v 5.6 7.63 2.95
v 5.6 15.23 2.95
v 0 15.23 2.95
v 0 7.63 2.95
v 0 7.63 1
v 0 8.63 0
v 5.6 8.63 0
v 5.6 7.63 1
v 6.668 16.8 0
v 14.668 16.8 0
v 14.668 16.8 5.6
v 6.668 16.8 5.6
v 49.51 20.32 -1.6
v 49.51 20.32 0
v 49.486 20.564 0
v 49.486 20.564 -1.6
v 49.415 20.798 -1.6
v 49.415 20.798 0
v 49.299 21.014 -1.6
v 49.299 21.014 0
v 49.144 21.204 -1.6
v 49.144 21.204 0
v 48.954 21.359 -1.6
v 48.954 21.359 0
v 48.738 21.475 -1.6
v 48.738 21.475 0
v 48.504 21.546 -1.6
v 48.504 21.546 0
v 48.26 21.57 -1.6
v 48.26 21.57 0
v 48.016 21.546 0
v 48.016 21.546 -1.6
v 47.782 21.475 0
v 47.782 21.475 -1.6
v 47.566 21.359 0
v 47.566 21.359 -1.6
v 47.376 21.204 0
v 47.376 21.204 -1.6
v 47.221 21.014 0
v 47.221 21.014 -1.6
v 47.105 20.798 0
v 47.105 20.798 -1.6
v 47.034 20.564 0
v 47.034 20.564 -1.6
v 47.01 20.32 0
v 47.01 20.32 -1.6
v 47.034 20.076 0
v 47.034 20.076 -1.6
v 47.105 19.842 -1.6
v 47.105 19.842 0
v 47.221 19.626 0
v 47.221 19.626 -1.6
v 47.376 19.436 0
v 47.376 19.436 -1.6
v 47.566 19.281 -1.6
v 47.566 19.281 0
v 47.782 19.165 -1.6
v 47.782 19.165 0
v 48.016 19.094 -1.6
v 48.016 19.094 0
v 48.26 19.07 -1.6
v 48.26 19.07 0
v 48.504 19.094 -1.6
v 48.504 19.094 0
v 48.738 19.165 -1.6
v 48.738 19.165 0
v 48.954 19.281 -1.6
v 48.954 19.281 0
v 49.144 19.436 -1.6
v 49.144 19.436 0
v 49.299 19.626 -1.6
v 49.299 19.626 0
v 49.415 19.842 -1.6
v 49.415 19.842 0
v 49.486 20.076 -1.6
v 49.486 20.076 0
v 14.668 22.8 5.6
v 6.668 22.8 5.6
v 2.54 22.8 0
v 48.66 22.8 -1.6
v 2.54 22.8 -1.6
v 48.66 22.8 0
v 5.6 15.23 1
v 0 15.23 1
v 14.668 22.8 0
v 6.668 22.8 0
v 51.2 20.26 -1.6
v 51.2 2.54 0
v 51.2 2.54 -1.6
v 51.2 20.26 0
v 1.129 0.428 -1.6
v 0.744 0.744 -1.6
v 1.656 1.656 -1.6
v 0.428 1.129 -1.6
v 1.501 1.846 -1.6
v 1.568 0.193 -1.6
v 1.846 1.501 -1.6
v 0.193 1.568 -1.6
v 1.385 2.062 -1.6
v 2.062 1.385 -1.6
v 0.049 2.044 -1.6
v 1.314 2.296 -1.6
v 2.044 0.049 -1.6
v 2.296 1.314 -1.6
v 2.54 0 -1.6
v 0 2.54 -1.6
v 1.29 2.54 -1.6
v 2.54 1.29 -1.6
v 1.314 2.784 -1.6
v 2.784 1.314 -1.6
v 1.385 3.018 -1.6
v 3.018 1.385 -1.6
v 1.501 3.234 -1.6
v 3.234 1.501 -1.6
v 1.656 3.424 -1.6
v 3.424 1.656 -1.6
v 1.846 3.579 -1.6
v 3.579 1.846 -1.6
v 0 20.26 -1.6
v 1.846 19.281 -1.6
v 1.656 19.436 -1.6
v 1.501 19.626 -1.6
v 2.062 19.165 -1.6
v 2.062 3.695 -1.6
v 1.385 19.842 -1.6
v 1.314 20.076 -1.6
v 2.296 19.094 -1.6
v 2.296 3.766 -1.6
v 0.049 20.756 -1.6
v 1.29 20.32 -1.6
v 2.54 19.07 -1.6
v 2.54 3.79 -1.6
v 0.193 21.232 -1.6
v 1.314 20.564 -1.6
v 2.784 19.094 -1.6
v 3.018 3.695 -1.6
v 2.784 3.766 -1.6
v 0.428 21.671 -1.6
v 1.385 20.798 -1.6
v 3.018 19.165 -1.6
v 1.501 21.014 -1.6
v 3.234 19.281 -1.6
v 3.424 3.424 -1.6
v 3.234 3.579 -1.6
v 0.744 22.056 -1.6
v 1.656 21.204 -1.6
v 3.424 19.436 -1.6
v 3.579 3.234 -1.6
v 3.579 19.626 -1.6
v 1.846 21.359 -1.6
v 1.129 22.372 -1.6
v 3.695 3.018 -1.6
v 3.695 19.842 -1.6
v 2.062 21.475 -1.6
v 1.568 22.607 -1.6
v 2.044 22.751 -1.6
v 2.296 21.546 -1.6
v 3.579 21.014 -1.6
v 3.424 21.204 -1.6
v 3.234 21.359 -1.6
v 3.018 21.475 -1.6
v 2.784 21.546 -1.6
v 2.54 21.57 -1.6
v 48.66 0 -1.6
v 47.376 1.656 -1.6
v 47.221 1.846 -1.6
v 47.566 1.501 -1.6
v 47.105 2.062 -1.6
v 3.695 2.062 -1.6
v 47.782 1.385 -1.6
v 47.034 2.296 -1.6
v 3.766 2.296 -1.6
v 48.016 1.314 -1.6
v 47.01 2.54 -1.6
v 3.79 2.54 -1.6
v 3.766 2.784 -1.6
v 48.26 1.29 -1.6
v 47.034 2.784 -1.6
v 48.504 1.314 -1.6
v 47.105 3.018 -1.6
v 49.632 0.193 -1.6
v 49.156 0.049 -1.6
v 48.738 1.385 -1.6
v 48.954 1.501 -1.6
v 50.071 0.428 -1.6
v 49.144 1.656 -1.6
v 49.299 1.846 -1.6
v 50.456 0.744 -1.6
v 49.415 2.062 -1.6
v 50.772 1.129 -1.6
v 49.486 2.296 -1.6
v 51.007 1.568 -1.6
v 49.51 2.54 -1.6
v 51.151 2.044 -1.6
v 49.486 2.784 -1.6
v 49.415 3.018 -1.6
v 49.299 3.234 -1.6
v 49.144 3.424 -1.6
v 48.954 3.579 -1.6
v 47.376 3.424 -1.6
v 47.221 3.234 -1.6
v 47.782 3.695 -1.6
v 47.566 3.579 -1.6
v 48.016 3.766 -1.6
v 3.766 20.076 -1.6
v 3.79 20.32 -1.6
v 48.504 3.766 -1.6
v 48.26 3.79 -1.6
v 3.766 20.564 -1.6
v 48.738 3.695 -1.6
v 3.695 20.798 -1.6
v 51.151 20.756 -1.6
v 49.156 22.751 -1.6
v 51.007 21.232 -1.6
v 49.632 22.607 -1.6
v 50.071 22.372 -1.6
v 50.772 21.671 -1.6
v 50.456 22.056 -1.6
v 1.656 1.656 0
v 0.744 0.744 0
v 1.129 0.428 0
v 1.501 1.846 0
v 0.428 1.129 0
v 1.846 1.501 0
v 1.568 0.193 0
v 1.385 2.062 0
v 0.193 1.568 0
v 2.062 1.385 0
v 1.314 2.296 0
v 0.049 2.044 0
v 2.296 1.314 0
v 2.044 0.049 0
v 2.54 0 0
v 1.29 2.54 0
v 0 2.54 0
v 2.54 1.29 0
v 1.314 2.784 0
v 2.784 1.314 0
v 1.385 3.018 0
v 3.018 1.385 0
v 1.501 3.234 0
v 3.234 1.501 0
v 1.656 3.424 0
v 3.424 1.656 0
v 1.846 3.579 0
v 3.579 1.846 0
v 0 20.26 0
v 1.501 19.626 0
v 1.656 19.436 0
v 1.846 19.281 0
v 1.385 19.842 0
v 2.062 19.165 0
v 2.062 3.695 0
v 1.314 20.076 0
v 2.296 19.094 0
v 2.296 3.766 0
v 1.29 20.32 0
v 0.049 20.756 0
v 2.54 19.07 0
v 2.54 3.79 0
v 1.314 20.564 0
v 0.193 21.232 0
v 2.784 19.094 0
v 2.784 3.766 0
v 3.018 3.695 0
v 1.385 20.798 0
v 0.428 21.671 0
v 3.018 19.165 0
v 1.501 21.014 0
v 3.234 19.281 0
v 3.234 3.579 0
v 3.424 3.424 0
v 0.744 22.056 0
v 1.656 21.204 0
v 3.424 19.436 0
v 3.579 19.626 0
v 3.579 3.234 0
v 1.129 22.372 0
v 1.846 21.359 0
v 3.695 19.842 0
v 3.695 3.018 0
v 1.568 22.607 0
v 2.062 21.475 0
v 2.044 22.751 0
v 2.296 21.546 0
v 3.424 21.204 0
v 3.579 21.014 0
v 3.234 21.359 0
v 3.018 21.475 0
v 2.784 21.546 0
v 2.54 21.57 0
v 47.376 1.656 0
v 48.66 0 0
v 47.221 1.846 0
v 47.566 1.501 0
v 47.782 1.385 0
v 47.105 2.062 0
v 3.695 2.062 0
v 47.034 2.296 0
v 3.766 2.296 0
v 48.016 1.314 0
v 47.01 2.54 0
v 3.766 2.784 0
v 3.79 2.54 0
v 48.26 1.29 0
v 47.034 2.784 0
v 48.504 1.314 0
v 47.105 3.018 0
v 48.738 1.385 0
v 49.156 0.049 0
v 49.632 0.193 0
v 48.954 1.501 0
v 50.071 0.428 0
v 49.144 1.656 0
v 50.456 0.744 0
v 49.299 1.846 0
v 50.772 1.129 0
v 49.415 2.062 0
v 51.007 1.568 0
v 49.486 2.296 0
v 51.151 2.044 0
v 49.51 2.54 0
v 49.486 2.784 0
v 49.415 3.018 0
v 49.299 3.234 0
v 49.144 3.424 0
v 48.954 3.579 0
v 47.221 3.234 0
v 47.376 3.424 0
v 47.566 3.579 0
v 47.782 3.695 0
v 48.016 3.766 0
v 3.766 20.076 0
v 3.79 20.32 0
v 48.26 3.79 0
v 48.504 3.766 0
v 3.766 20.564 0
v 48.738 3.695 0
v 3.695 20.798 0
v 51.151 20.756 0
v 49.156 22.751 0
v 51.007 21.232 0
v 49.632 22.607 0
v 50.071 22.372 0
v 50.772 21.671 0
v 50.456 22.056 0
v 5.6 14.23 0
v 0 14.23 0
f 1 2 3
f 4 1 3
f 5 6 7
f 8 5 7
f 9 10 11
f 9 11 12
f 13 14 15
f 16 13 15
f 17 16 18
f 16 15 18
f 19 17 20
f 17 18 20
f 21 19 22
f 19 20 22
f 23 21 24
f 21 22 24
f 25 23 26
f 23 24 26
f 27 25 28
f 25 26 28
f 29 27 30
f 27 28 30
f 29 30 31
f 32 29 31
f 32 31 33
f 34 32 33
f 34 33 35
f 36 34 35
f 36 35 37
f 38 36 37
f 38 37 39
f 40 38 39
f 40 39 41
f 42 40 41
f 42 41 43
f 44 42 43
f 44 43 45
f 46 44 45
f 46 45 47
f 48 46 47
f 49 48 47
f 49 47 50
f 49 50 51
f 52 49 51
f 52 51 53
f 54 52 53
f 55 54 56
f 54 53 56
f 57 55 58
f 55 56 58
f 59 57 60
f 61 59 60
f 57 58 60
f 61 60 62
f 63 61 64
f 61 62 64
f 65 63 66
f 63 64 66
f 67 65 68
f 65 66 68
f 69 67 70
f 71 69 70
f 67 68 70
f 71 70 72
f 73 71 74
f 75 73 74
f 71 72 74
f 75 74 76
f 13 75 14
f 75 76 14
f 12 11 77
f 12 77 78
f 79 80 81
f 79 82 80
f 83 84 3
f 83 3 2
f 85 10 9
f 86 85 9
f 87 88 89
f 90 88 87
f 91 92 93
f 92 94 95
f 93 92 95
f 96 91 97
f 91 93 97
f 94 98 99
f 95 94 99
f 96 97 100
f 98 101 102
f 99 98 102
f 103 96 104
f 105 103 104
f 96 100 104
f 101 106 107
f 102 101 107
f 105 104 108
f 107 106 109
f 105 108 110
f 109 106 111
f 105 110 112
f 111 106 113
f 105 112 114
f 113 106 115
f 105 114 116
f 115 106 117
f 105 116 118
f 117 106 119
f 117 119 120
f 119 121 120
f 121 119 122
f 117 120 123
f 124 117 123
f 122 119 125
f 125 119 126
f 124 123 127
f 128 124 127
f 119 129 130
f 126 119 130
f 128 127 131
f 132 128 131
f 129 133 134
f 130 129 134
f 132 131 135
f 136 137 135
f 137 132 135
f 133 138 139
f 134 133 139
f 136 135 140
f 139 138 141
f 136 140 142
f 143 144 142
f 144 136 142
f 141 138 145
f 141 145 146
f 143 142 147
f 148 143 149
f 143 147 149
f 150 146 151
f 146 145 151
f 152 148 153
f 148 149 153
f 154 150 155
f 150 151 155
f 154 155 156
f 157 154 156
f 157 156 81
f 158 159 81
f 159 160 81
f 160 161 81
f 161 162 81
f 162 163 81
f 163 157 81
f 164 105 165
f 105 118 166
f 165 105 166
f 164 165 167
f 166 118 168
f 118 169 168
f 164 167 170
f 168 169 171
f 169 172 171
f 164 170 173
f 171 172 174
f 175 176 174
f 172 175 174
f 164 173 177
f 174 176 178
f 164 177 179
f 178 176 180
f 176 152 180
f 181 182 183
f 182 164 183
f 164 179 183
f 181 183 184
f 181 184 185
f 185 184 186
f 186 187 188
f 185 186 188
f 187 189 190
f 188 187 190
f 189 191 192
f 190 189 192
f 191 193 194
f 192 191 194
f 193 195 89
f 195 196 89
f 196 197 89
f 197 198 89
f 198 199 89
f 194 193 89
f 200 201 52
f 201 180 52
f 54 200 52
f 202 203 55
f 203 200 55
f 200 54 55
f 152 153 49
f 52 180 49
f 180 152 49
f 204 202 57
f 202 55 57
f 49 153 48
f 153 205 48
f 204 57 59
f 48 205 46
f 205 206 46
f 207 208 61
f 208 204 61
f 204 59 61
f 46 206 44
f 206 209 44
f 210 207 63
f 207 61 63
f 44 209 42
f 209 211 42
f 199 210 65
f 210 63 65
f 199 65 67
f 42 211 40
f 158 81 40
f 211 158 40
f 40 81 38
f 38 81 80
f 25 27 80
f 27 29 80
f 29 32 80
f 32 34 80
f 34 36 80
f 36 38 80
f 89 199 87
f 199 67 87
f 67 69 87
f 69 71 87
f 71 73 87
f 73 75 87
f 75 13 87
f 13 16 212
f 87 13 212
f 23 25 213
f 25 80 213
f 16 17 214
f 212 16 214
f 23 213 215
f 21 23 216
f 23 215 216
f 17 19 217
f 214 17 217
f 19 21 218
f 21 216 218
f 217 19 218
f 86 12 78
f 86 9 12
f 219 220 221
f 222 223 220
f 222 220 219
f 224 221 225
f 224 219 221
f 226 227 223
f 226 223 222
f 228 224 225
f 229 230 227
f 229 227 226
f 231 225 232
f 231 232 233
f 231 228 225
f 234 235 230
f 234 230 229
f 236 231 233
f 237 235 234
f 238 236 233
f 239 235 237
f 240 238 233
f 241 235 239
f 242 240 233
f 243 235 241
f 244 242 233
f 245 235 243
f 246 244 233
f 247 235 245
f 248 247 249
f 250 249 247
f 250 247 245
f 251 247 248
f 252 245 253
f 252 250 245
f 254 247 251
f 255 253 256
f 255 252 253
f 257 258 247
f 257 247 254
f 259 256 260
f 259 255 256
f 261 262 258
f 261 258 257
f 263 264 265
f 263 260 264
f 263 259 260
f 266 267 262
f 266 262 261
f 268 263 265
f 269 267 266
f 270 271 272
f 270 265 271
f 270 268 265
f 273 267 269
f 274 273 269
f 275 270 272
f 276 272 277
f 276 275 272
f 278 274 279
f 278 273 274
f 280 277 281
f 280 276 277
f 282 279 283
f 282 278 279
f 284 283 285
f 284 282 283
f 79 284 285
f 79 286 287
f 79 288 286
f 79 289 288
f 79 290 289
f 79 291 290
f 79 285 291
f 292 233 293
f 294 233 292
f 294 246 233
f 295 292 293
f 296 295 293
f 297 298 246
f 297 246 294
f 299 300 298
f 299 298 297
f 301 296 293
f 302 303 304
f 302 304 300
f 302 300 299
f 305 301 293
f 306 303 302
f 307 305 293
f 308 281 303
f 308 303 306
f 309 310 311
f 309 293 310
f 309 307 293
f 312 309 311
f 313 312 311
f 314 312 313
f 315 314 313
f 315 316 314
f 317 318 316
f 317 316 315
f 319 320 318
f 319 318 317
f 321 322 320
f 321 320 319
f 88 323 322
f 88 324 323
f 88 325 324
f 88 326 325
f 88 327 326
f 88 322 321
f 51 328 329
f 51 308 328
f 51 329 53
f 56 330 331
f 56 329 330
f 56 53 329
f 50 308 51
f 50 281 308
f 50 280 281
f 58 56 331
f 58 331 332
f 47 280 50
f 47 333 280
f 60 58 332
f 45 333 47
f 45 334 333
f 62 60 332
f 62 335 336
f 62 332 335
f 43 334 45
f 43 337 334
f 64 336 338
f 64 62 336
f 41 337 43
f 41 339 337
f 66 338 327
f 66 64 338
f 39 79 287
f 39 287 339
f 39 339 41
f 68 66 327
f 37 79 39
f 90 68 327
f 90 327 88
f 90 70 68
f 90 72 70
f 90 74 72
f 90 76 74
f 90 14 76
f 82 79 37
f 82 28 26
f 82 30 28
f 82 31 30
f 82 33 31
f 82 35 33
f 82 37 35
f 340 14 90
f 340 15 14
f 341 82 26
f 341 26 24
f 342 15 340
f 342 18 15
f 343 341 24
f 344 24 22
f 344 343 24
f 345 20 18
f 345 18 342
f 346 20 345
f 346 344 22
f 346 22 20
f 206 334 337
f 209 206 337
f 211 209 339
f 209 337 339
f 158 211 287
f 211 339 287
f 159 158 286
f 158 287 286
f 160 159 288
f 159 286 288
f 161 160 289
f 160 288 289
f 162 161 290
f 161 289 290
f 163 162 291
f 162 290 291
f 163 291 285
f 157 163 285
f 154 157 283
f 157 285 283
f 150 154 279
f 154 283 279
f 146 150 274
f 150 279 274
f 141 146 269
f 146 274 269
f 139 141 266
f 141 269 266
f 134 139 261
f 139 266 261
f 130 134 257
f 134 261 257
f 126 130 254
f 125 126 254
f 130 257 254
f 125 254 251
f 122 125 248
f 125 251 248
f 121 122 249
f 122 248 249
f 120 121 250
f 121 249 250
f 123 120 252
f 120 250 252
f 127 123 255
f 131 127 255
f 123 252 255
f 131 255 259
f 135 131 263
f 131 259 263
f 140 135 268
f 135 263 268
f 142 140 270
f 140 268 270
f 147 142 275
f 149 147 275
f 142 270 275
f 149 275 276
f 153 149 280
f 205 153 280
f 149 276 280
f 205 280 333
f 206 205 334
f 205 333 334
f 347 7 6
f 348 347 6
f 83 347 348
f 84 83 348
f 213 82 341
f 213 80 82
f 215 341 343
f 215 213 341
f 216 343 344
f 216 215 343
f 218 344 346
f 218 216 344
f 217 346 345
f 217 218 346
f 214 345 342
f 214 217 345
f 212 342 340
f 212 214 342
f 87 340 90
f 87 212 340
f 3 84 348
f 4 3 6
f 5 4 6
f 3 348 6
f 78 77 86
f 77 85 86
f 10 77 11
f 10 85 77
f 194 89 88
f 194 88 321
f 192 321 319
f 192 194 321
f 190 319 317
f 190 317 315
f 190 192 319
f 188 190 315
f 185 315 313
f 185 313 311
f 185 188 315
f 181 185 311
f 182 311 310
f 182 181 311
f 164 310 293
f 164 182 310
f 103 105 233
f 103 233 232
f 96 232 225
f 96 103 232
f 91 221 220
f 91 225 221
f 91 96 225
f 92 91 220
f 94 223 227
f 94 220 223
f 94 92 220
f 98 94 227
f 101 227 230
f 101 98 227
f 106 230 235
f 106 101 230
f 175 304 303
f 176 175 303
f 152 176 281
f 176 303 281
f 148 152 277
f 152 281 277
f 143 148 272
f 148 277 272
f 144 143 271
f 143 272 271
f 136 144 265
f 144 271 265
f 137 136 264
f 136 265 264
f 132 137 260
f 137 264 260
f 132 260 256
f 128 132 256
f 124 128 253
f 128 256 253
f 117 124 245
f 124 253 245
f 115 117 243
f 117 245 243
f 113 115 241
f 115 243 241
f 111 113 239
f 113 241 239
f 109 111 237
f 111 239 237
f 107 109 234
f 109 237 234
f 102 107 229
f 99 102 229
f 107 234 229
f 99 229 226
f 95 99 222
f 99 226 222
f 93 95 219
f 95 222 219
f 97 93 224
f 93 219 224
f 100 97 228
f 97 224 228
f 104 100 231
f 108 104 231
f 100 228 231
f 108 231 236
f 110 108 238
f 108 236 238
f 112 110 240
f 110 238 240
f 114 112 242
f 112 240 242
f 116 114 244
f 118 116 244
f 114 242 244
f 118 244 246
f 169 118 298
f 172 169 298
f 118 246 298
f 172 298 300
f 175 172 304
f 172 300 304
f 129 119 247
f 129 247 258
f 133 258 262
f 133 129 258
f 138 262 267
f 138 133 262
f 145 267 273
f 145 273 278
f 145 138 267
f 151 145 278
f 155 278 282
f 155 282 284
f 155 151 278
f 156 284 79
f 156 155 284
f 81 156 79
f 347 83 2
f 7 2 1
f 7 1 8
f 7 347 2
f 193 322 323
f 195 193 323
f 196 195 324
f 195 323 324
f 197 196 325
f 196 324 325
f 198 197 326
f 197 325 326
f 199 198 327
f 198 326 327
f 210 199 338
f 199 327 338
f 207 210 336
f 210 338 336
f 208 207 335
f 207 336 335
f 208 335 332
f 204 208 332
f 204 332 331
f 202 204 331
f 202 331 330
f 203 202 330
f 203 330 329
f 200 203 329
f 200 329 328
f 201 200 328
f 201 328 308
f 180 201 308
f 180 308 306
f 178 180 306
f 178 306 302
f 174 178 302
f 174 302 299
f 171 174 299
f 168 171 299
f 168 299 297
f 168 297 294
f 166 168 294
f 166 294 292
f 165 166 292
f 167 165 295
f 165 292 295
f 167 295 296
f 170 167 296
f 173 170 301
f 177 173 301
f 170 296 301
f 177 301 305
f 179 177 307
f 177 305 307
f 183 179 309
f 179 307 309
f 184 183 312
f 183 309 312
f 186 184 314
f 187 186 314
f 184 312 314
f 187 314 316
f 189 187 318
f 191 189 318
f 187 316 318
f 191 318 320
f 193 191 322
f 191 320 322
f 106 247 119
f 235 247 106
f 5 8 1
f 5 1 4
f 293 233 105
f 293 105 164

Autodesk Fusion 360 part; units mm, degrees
sketch "pcb" plane through (0, 0, 0) normal (0, 0, 1) x (1, 0, 0)
  line L0 (0, 0) -> (51.2, 0)
  line L1 (51.2, 0) -> (51.2, 22.8)
  line L2 (51.2, 22.8) -> (0, 22.8)
  line L3 (0, 22.8) -> (0, 0)
  circle A0 centre (2.54, 2.54) radius 1.25
  circle A1 centre (2.54, 20.32) radius 1.25
  circle A2 centre (48.26, 20.32) radius 1.25
  circle A3 centre (48.26, 2.54) radius 1.25
  dimension "d1" = 51.2
  dimension "d2" = 22.8
  dimension "d3" = 2.5
  dimension "d4" = 2.54
  dimension "d5" = 2.54
  dimension "d6" = 2.5
  dimension "d7" = 2.54
  dimension "d8" = 20.32
  dimension "d9" = 2.5
  dimension "d10" = 48.26
  dimension "d11" = 20.32
  dimension "d12" = 2.5
  dimension "d13" = 2.54
  dimension "d14" = 48.26
extrude "Extrude1" add sketch "pcb" against normal blind 1.6 makes body 1
fillet "Fillet1" radius 2.54 4 edges at (0, 0, -0.8) (0, 22.8, -0.8) (51.2, 0, -0.8) (51.2, 22.8, -0.8) on bodies 1
sketch "microusb" plane through (0, 0, 0) normal (0, 0, 1) x (-1, 0, 0)
  arc A0 (-51.2, -20.26) -> (-48.66, -22.8) centre (-48.66, -20.26) ccw
  line L0 (-48.66, -22.8) -> (-2.54, -22.8)
  arc A1 (-2.54, -22.8) -> (0, -20.26) centre (-2.54, -20.26) ccw
  line L1 (0, -20.26) -> (0, -2.54)
  arc A2 (0, -2.54) -> (-2.54, 0) centre (-2.54, -2.54) ccw
  line L2 (-2.54, 0) -> (-48.66, 0)
  arc A3 (-48.66, 0) -> (-51.2, -2.54) centre (-48.66, -2.54) ccw
  line L3 (-51.2, -2.54) -> (-51.2, -20.26)
  circle A4 centre (-2.54, -2.54) radius 1.25
  circle A5 centre (-48.26, -20.32) radius 1.25
  circle A6 centre (-48.26, -2.54) radius 1.25
  circle A7 centre (-2.54, -20.32) radius 1.25
  line L4 (0, -15.23) -> (-5.6, -15.23)
  line L5 (-5.6, -15.23) -> (-5.6, -7.63)
  line L6 (-5.6, -7.63) -> (0, -7.63)
  line L7 (0, -7.63) -> (0, -15.23)
  line L8 (-5.6, -11.43) -> (0, -11.43) construction
  dimension "d18" = 7.6
  dimension "d19" = 5.6
  dimension "d20" = 11.43
extrude "Extrude2" add sketch "microusb" along normal blind 2.95 separate body contours L1 L4 L5 L6 L7 makes body 2
chamfer "Chamfer1" distance 1 angle 45 2 edges at (2.8, 15.23, 0) (2.8, 7.63, 0) on bodies 2
sketch "jst" plane through (0, 0, 0) normal (0, 0, 1) x (-1, 0, 0)
  arc A0 (-51.2, -20.26) -> (-48.66, -22.8) centre (-48.66, -20.26) ccw
  line L0 (-48.66, -22.8) -> (-2.54, -22.8)
  arc A1 (-2.54, -22.8) -> (0, -20.26) centre (-2.54, -20.26) ccw
  line L1 (0, -20.26) -> (0, -2.54)
  arc A2 (0, -2.54) -> (-2.54, 0) centre (-2.54, -2.54) ccw
  line L2 (-2.54, 0) -> (-48.66, 0)
  arc A3 (-48.66, 0) -> (-51.2, -2.54) centre (-48.66, -2.54) ccw
  line L3 (-51.2, -2.54) -> (-51.2, -20.26)
  circle A4 centre (-2.54, -2.54) radius 1.25
  circle A5 centre (-48.26, -20.32) radius 1.25
  circle A6 centre (-48.26, -2.54) radius 1.25
  circle A7 centre (-2.54, -20.32) radius 1.25
  line L4 (-6.668, -22.8) -> (-14.668, -22.8)
  line L5 (-14.668, -22.8) -> (-14.668, -16.8)
  line L6 (-14.668, -16.8) -> (-6.668, -16.8)
  line L7 (-6.668, -16.8) -> (-6.668, -22.8)
  line L8 (-10.668, -22.8) -> (-10.668, -16.8) construction
  dimension "d24" = 8
  dimension "d25" = 6
  dimension "d26" = 10.668
extrude "Extrude3" add sketch "jst" along normal blind 5.6 separate body contours L0 L4 L5 L6 L7 makes body 3
